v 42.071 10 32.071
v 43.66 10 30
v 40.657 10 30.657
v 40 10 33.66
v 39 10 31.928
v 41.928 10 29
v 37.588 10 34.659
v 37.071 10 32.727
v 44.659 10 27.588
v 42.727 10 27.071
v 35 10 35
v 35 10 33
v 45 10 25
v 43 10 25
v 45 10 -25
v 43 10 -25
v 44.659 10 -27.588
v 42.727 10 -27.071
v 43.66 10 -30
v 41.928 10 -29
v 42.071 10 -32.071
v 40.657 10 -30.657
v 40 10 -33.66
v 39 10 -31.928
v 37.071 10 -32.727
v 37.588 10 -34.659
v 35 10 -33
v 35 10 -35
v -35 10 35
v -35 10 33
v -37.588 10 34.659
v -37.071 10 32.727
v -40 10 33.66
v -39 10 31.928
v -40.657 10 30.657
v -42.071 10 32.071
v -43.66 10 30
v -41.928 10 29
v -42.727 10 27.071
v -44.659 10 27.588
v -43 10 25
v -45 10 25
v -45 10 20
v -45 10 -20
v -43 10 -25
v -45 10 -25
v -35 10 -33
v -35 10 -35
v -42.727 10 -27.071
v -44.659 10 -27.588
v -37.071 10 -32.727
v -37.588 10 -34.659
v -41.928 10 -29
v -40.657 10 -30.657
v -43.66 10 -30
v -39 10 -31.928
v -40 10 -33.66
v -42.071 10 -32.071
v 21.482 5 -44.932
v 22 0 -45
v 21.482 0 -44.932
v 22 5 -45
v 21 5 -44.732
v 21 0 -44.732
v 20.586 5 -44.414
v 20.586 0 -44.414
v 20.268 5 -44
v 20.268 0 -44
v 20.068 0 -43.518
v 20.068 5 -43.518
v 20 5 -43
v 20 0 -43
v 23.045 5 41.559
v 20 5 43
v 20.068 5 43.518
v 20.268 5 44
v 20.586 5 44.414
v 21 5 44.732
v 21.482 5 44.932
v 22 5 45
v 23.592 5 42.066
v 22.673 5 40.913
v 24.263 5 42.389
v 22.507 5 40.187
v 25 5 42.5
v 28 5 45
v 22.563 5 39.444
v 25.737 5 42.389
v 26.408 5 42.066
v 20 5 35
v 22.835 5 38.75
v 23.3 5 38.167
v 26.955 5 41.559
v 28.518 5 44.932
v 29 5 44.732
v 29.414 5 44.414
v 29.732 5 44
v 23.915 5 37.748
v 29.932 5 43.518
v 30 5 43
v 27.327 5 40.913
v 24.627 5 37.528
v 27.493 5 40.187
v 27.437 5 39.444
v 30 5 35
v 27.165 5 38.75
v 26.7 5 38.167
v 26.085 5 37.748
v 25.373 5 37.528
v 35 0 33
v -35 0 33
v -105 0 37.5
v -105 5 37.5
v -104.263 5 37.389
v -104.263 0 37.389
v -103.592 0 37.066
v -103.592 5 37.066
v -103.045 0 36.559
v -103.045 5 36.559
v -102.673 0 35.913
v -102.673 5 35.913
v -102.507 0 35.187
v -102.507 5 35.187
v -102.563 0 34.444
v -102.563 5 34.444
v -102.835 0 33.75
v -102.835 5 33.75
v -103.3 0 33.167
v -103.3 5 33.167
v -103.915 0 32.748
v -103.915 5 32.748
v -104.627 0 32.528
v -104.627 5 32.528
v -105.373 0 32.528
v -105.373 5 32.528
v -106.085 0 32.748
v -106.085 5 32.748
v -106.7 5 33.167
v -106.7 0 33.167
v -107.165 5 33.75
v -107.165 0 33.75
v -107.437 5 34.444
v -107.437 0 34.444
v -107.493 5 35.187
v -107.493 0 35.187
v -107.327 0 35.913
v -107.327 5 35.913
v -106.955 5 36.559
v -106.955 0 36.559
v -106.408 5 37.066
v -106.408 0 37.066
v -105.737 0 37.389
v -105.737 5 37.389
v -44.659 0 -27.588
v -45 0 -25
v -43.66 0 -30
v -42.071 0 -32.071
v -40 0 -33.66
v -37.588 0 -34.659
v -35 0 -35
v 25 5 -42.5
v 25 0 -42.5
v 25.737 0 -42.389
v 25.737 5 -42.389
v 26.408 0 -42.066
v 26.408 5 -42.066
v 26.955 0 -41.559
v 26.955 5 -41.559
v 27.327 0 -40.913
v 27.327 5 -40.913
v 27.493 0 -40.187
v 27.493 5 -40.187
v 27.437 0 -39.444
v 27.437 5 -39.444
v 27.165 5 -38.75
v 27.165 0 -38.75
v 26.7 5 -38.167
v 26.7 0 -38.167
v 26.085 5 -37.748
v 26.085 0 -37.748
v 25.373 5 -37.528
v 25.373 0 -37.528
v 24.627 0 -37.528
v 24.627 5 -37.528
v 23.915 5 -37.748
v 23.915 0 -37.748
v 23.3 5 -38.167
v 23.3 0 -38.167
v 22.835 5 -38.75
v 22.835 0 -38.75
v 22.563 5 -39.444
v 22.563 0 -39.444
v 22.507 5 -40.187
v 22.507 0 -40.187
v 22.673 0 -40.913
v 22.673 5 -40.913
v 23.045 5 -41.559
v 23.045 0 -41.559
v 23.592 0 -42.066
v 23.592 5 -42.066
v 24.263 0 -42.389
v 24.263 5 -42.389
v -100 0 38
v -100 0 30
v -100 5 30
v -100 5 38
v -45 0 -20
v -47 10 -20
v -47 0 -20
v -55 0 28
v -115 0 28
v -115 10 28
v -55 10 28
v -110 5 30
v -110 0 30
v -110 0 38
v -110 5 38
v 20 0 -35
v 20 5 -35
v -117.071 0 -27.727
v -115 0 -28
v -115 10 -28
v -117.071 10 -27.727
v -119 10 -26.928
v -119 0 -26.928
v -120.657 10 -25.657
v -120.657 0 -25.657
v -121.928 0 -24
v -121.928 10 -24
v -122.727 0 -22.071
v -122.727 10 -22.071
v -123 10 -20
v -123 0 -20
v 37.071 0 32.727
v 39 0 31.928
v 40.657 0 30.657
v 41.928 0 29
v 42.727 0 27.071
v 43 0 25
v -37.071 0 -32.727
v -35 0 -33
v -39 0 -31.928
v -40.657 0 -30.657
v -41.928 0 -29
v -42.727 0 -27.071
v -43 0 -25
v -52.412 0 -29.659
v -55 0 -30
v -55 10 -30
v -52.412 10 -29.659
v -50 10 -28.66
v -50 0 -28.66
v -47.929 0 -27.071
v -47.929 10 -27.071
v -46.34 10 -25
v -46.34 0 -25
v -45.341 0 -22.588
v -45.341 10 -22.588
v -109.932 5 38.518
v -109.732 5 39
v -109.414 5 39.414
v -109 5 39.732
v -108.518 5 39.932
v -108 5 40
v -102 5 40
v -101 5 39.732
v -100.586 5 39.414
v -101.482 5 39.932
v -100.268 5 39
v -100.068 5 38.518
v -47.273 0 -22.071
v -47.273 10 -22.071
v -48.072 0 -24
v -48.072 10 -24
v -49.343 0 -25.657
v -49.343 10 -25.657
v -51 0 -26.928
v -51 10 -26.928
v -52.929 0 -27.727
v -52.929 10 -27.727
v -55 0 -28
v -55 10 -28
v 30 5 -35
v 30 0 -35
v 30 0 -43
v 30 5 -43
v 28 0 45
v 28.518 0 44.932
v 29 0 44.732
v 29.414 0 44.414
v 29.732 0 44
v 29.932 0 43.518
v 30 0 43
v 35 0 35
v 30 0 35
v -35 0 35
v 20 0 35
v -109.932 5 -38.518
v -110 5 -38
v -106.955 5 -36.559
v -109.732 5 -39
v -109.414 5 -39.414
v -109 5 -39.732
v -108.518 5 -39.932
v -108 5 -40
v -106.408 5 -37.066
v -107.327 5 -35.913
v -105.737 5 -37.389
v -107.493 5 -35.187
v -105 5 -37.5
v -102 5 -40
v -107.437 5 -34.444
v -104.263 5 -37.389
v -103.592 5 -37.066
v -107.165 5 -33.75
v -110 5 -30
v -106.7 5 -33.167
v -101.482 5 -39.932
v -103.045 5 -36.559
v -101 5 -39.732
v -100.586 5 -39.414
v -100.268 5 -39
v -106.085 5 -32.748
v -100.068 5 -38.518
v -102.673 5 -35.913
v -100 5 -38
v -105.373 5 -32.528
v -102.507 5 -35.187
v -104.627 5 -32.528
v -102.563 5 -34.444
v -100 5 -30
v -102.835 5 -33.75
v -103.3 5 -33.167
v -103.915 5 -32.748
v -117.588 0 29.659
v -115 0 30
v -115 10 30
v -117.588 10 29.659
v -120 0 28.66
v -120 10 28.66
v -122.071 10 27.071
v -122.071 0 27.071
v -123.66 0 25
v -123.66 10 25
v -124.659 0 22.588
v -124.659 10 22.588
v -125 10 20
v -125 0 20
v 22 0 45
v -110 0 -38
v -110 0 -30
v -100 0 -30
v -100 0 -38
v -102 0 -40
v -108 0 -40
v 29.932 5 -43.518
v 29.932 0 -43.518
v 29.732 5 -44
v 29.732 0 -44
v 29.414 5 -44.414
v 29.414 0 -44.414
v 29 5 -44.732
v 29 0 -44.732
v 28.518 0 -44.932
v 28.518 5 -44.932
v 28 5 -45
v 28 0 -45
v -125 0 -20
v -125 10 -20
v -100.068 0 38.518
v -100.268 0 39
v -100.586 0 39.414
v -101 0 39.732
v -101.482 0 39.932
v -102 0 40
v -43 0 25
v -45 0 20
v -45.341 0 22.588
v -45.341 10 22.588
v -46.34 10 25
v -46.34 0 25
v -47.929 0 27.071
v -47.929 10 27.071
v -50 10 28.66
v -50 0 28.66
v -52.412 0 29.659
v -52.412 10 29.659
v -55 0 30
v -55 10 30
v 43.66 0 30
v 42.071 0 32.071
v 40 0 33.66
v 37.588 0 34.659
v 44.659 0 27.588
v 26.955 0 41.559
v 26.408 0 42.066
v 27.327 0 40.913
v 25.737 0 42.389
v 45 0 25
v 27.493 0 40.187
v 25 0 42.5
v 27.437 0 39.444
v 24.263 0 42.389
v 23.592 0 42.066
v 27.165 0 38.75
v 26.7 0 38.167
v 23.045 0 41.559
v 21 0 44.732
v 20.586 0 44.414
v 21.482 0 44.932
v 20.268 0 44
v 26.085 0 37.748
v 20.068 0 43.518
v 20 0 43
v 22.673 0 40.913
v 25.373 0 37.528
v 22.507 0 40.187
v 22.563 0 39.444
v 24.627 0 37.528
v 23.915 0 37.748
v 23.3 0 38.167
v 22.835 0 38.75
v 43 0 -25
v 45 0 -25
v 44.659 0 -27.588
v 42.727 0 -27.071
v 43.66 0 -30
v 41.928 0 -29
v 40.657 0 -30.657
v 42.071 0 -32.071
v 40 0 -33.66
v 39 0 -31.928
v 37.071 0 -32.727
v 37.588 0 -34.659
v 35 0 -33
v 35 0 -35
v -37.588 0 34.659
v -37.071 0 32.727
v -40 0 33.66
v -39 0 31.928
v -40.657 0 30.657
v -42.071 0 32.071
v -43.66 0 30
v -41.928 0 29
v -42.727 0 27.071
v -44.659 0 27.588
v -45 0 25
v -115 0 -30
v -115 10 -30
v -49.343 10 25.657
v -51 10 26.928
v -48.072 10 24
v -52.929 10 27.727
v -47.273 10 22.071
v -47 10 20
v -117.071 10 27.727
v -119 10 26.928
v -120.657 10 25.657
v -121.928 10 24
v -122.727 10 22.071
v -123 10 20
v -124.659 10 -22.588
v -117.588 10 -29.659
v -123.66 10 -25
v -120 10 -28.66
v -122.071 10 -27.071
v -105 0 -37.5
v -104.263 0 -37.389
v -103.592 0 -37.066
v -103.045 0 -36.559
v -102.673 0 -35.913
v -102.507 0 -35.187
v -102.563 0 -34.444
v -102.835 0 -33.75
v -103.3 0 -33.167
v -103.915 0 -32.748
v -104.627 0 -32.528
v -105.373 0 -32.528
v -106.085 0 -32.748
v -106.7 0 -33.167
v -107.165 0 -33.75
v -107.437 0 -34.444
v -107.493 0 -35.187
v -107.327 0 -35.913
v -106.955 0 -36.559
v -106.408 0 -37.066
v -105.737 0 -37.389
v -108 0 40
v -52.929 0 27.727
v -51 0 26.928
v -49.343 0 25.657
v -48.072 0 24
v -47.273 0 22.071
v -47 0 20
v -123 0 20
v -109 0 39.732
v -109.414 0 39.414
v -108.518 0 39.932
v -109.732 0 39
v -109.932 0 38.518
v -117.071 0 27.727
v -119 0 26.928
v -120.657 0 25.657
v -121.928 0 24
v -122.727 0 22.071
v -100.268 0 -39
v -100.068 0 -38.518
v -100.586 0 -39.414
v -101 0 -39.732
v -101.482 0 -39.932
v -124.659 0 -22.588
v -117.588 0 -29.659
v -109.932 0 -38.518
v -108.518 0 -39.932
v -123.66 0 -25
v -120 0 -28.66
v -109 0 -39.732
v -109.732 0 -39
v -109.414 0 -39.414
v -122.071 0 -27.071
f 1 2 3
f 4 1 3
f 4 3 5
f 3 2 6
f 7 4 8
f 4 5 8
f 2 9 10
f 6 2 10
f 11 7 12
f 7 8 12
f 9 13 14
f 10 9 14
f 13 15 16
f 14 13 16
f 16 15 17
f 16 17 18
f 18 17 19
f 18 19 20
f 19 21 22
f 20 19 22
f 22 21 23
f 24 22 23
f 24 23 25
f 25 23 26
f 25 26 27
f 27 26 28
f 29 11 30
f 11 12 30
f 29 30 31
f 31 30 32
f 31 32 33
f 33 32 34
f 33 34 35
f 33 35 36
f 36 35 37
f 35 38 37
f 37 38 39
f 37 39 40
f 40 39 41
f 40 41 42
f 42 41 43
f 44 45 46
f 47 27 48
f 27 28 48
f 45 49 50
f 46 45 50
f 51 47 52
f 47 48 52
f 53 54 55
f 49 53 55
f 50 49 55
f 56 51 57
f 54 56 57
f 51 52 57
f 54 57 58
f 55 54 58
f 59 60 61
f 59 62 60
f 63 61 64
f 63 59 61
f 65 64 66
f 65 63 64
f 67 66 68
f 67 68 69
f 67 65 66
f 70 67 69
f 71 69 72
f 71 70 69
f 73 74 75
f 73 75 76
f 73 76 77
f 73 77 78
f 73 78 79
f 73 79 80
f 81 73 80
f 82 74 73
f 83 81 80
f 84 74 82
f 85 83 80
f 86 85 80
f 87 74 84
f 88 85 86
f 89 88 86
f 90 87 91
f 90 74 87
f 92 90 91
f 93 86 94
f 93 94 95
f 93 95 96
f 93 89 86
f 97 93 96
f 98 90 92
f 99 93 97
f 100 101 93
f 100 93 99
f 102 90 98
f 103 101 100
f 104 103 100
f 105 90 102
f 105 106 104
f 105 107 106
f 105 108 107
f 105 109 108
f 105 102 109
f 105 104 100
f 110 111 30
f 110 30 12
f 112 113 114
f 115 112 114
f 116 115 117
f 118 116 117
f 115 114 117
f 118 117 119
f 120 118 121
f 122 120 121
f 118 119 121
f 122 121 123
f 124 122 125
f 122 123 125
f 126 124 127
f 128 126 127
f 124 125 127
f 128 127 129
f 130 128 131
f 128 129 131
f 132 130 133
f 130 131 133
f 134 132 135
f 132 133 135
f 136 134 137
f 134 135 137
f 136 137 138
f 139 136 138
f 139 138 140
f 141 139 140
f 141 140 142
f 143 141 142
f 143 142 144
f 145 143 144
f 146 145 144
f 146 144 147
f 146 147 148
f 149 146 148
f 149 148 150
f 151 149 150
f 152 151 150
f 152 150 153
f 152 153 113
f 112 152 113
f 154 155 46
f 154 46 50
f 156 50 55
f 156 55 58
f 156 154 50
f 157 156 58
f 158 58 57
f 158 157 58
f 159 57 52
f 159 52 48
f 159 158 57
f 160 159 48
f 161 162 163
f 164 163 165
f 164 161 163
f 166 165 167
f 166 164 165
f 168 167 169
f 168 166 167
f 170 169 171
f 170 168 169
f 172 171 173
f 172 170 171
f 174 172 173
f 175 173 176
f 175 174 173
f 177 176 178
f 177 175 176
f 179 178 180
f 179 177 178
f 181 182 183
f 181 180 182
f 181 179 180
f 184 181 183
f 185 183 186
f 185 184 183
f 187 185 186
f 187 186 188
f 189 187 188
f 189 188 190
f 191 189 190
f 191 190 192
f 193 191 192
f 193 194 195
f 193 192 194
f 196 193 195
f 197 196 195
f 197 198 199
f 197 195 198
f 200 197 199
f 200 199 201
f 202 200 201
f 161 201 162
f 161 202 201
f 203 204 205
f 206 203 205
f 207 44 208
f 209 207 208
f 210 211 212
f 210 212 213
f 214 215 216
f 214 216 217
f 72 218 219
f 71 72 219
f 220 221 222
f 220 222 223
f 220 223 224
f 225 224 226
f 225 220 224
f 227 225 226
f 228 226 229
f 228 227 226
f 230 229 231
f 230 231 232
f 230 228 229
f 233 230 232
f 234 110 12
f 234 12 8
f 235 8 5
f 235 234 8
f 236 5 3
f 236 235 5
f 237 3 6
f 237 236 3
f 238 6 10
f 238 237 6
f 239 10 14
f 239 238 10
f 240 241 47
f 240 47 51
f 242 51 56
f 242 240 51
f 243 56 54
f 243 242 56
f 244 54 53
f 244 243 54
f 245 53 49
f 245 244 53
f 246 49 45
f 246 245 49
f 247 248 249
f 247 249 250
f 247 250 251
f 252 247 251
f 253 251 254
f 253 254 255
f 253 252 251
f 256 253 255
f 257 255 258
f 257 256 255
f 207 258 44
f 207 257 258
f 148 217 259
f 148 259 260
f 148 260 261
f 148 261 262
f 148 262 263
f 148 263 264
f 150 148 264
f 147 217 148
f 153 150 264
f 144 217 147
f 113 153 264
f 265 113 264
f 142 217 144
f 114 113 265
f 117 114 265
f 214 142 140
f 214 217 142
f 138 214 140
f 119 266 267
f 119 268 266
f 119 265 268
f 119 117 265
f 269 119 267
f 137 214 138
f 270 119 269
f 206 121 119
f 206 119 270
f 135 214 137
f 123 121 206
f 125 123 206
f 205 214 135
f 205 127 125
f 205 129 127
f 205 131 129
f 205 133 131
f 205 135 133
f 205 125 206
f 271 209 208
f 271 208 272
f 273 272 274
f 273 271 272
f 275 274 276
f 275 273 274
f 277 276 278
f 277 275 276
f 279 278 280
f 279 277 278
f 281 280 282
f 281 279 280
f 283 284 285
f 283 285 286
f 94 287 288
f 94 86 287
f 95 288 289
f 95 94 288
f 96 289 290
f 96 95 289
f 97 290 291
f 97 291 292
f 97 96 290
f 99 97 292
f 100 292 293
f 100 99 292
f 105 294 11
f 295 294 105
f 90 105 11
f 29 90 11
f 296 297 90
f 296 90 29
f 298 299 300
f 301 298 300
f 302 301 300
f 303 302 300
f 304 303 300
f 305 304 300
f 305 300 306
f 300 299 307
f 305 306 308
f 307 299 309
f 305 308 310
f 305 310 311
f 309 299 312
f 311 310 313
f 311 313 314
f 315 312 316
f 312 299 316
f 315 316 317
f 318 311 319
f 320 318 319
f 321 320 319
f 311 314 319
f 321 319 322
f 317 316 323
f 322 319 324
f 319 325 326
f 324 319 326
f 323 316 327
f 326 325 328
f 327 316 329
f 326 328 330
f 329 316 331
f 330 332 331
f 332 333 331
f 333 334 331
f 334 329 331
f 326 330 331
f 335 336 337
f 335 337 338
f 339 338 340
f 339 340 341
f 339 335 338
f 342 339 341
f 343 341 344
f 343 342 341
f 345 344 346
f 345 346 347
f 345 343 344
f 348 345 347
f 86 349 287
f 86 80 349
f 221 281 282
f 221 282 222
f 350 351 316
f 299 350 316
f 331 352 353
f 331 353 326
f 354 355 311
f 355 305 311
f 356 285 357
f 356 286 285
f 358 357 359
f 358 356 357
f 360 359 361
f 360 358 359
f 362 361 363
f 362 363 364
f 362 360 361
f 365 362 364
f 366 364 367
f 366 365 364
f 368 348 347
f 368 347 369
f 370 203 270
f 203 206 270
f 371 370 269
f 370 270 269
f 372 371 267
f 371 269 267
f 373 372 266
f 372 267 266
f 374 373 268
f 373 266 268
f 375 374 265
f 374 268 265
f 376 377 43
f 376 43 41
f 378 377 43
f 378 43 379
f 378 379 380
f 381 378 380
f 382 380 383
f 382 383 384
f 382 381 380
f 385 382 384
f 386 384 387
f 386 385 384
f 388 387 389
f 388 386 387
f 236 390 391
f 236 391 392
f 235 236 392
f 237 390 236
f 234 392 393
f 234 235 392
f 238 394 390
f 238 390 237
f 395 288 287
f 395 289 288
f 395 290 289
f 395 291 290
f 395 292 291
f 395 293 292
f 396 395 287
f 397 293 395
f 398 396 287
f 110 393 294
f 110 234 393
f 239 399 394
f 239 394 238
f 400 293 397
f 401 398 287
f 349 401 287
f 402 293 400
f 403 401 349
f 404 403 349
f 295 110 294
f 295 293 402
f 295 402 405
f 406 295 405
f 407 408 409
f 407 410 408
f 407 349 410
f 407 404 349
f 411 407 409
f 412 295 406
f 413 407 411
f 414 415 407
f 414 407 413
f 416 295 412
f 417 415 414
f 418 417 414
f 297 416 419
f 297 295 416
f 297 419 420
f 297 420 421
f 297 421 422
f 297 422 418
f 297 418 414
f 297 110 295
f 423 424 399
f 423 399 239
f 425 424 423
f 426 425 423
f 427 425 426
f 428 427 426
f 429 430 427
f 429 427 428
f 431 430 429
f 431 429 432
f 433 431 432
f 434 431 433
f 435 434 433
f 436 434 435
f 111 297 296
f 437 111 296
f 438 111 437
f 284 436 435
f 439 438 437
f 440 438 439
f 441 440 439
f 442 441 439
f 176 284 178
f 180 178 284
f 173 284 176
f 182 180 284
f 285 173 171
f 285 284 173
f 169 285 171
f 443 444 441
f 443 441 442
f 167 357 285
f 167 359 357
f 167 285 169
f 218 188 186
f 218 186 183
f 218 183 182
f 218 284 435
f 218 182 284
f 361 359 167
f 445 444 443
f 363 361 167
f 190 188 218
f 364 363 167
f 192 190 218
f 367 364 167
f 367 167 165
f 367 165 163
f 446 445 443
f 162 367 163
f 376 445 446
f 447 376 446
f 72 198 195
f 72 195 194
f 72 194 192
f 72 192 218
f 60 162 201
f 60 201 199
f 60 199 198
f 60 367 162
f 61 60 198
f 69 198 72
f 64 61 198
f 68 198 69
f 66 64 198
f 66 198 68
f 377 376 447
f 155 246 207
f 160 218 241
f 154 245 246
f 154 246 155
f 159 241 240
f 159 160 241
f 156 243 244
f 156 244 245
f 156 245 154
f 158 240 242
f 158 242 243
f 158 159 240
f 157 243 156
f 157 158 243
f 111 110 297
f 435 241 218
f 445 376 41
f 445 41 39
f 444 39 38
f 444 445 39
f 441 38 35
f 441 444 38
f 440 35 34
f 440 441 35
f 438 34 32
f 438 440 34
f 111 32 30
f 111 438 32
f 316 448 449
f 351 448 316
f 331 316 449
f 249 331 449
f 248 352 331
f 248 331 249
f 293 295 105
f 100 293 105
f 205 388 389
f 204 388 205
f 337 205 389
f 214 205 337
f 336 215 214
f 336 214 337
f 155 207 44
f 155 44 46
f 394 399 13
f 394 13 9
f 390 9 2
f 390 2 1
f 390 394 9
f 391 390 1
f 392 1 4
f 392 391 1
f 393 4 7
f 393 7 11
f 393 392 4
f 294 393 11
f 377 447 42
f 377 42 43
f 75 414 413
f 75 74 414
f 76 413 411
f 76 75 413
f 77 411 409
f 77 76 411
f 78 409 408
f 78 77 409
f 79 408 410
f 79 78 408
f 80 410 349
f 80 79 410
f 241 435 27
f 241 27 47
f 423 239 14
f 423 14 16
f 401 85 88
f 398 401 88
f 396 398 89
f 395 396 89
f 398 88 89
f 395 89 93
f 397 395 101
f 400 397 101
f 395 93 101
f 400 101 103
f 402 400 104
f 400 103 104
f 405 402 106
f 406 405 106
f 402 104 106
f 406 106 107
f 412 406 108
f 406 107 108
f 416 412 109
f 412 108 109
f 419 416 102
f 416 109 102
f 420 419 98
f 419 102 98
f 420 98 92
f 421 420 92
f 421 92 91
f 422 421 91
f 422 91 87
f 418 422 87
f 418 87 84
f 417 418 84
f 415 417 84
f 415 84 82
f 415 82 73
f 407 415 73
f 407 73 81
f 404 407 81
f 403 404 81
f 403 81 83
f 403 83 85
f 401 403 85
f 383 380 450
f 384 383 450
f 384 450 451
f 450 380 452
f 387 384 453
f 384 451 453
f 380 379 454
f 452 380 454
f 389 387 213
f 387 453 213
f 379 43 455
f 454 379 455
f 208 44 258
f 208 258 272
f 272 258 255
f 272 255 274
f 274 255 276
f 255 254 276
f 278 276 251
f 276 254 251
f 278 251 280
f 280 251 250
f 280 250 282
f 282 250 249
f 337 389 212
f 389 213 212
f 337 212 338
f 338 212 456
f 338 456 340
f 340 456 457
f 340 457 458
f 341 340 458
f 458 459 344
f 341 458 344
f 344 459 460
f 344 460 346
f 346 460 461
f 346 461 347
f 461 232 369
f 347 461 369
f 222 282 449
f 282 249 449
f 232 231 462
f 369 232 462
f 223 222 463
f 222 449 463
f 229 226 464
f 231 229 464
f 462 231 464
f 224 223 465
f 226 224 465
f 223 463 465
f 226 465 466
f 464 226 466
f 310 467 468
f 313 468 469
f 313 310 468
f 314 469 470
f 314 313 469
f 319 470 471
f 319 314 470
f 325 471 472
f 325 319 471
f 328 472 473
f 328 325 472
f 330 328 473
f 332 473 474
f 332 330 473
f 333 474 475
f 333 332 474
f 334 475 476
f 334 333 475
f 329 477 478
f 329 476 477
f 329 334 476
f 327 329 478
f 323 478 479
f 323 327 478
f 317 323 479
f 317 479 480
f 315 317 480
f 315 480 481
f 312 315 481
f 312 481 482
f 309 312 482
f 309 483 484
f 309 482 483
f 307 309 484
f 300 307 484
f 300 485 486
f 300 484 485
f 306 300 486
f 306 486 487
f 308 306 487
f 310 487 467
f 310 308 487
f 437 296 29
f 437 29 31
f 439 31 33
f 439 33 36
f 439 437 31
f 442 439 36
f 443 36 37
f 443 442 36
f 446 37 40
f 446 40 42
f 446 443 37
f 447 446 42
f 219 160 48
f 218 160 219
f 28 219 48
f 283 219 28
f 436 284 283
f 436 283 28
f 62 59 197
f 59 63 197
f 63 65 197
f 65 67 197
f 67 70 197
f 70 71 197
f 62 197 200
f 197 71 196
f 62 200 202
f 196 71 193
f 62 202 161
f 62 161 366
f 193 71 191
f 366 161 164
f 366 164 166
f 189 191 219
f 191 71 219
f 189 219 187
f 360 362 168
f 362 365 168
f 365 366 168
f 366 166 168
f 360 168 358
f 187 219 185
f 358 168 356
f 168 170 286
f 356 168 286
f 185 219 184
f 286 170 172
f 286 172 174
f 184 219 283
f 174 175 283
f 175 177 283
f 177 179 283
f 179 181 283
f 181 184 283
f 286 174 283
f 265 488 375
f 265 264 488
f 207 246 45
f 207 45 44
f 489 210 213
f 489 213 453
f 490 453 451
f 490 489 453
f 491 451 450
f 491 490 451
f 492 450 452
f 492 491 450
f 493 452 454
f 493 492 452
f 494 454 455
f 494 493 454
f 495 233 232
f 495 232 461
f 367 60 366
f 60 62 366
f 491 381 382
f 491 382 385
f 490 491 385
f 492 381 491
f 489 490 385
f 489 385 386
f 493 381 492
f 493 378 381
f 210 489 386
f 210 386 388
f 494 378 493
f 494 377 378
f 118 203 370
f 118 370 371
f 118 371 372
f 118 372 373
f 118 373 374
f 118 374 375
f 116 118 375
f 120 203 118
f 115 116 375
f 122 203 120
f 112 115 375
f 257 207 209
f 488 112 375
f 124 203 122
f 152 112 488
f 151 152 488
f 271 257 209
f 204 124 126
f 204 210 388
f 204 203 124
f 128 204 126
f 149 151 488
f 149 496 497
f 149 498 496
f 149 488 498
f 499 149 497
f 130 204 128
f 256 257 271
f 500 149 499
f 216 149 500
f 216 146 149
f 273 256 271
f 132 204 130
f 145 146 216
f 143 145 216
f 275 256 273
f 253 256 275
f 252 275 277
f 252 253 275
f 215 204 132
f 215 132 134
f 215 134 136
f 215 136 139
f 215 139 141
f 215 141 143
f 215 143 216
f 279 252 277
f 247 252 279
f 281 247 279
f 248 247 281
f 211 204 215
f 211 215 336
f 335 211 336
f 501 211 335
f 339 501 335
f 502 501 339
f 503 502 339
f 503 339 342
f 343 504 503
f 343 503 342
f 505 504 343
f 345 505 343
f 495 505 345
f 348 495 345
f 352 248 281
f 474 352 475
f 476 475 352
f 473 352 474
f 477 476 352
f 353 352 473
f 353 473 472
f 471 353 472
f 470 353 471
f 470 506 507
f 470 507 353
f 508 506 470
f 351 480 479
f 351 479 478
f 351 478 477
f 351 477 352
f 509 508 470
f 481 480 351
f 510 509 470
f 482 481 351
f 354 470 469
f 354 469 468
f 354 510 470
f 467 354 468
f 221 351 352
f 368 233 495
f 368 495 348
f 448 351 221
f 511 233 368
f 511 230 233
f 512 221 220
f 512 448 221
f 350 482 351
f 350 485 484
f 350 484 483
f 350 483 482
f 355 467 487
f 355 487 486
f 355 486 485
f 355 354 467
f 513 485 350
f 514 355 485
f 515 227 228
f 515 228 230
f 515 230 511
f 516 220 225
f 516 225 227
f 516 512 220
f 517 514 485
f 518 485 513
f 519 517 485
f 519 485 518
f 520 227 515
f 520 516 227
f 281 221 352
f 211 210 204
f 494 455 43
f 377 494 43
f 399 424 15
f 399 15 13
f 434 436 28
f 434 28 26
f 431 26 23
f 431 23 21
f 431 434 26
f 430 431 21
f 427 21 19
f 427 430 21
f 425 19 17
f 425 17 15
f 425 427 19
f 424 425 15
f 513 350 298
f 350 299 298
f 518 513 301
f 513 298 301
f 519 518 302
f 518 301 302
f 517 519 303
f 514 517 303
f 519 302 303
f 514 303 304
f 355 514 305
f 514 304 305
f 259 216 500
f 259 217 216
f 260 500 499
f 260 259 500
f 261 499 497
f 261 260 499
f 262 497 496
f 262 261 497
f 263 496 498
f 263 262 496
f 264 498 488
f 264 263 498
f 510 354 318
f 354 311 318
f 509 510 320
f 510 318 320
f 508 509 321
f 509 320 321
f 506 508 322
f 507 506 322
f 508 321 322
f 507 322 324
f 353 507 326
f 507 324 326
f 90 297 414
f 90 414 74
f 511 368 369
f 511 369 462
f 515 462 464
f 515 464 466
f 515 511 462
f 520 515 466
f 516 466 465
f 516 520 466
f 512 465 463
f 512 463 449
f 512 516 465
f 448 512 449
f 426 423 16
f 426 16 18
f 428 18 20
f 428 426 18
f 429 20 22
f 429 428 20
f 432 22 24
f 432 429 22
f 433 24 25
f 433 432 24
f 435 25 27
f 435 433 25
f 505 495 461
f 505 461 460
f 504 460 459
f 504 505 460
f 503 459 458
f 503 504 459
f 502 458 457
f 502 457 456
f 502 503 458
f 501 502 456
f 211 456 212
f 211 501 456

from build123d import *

# Parameters (mm, degrees)
BOSS_EXTRUDE1_DEPTH   = 10
BOSS_EXTRUDE1_2_DEPTH = 10
SKETCH3_W             = 10
SKETCH3_H             = 5
BOSS_EXTRUDE8_DEPTH   = 10
SKETCH4_R             = 2.5
CUT_EXTRUDE1_DEPTH    = 10
FILLET1_R             = 2
FILLET1_OF_MIRROR4_R  = 2
SKETCH5_W             = 10
SKETCH5_H             = 5
BOSS_EXTRUDE9_DEPTH   = 10
SKETCH7_R             = 2.5
CUT_EXTRUDE2_DEPTH    = 10
FILLET3_R             = 2
FILLET3_OF_MIRROR18_R = 2


with BuildPart() as part:
    # Sketch1 → Boss-Extrude1 (new body)
    with BuildSketch(Plane(origin=(0, 0, 0), x_dir=(1, 0, 0), z_dir=(0, 1, 0))):
        with BuildLine():
            Line((-55, 28), (-115, 28))
            ThreePointArc((-115, 28), (-120.656854249, 25.656854249), (-123, 20))
            Line((-123, 20), (-123, -20))
            ThreePointArc((-123, -20), (-120.656854249, -25.656854249), (-115, -28))
            Line((-115, -28), (-55, -28))
            ThreePointArc((-55, -28), (-49.343145751, -25.656854249), (-47, -20))
            Line((-47, -20), (-45, -20))
            ThreePointArc((-45, -20), (-47.928932188, -27.071067812), (-55, -30))
            Line((-55, -30), (-115, -30))
            ThreePointArc((-115, -30), (-122.071067812, -27.071067812), (-125, -20))
            Line((-125, -20), (-125, 20))
            ThreePointArc((-125, 20), (-122.071067812, 27.071067812), (-115, 30))
            Line((-115, 30), (-55, 30))
            ThreePointArc((-55, 30), (-47.928932188, 27.071067812), (-45, 20))
            Line((-45, 20), (-47, 20))
            ThreePointArc((-47, 20), (-49.343145751, 25.656854249), (-55, 28))
        make_face()
    extrude(amount=BOSS_EXTRUDE1_DEPTH)

    # Sketch3 → Boss-Extrude8 (add)
    with BuildSketch(Plane.XY.offset(30)):
        with Locations((-105, 2.5)):
            Rectangle(SKETCH3_W, SKETCH3_H)
    boss_extrude8 = extrude(amount=BOSS_EXTRUDE8_DEPTH)

    # Sketch4 → Cut-Extrude1 (cut)
    with BuildSketch(Plane(origin=(0, 5, 0), x_dir=(1, 0, 0), z_dir=(0, 1, 0))):
        with Locations(Location((-105, -35, 0), (0, 0, 270))):
            Circle(SKETCH4_R)
    cut_extrude1 = extrude(amount=-CUT_EXTRUDE1_DEPTH, mode=Mode.SUBTRACT)

    # Fillet1
    fillet1_edges = [part.edges().sort_by_distance(p)[0] for p in [
        (-110, 2.5, 40),
        (-100, 2.5, 40),
    ]]
    fillet(fillet1_edges, radius=FILLET1_R)

    # Mirror4: Boss-Extrude8, Cut-Extrude1 across plane
    add(boss_extrude8.mirror(Plane.XY))
    add(cut_extrude1.mirror(Plane.XY), mode=Mode.SUBTRACT)

    # Fillet1 of Mirror4
    fillet1_of_mirror4_edges = [part.edges().sort_by_distance(p)[0] for p in [
        (-110, 2.5, -40),
        (-100, 2.5, -40),
    ]]
    fillet(fillet1_of_mirror4_edges, radius=FILLET1_OF_MIRROR4_R)


with BuildPart() as body_2:
    # Sketch1 → Boss-Extrude1 2 (new body)
    with BuildSketch(Plane(origin=(0, 0, 0), x_dir=(1, 0, 0), z_dir=(0, 1, 0))):
        with BuildLine():
            ThreePointArc((35, -33), (40.656854249, -30.656854249), (43, -25))
            Line((43, -25), (43, 25))
            ThreePointArc((43, 25), (40.656854249, 30.656854249), (35, 33))
            Line((35, 33), (-35, 33))
            ThreePointArc((-35, 33), (-40.656854249, 30.656854249), (-43, 25))
            Line((-43, 25), (-45, 20))
            Line((-45, 20), (-45, 25))
            ThreePointArc((-45, 25), (-42.071067812, 32.071067812), (-35, 35))
            Line((-35, 35), (35, 35))
            ThreePointArc((35, 35), (42.071067812, 32.071067812), (45, 25))
            Line((45, 25), (45, -25))
            ThreePointArc((45, -25), (42.071067812, -32.071067812), (35, -35))
            Line((35, -35), (-35, -35))
            ThreePointArc((-35, -35), (-42.071067812, -32.071067812), (-45, -25))
            Line((-45, -25), (-45, -20))
            Line((-45, -20), (-43, -25))
            ThreePointArc((-43, -25), (-40.656854249, -30.656854249), (-35, -33))
            Line((-35, -33), (35, -33))
        make_face()
    extrude(amount=BOSS_EXTRUDE1_2_DEPTH)

    # Sketch5 → Boss-Extrude9 (add)
    with BuildSketch(Plane.XY.offset(35)):
        with Locations((25, 2.5)):
            Rectangle(SKETCH5_W, SKETCH5_H)
    boss_extrude9 = extrude(amount=BOSS_EXTRUDE9_DEPTH)

    # Sketch7 → Cut-Extrude2 (cut)
    with BuildSketch(Plane(origin=(0, 5, 0), x_dir=(1, 0, 0), z_dir=(0, 1, 0))):
        with Locations(Location((25, -40, 0), (0, 0, 270))):
            Circle(SKETCH7_R)
    cut_extrude2 = extrude(amount=-CUT_EXTRUDE2_DEPTH, mode=Mode.SUBTRACT)

    # Fillet3
    fillet3_edges = [body_2.edges().sort_by_distance(p)[0] for p in [
        (30, 2.5, 45),
        (20, 2.5, 45),
    ]]
    fillet(fillet3_edges, radius=FILLET3_R)

    # Mirror18: Boss-Extrude9, Cut-Extrude2 across plane
    add(boss_extrude9.mirror(Plane.XY))
    add(cut_extrude2.mirror(Plane.XY), mode=Mode.SUBTRACT)

    # Fillet3 of Mirror18
    fillet3_of_mirror18_edges = [body_2.edges().sort_by_distance(p)[0] for p in [
        (30, 2.5, -45),
        (20, 2.5, -45),
    ]]
    fillet(fillet3_of_mirror18_edges, radius=FILLET3_OF_MIRROR18_R)


solid = Compound([part.part, body_2.part])
